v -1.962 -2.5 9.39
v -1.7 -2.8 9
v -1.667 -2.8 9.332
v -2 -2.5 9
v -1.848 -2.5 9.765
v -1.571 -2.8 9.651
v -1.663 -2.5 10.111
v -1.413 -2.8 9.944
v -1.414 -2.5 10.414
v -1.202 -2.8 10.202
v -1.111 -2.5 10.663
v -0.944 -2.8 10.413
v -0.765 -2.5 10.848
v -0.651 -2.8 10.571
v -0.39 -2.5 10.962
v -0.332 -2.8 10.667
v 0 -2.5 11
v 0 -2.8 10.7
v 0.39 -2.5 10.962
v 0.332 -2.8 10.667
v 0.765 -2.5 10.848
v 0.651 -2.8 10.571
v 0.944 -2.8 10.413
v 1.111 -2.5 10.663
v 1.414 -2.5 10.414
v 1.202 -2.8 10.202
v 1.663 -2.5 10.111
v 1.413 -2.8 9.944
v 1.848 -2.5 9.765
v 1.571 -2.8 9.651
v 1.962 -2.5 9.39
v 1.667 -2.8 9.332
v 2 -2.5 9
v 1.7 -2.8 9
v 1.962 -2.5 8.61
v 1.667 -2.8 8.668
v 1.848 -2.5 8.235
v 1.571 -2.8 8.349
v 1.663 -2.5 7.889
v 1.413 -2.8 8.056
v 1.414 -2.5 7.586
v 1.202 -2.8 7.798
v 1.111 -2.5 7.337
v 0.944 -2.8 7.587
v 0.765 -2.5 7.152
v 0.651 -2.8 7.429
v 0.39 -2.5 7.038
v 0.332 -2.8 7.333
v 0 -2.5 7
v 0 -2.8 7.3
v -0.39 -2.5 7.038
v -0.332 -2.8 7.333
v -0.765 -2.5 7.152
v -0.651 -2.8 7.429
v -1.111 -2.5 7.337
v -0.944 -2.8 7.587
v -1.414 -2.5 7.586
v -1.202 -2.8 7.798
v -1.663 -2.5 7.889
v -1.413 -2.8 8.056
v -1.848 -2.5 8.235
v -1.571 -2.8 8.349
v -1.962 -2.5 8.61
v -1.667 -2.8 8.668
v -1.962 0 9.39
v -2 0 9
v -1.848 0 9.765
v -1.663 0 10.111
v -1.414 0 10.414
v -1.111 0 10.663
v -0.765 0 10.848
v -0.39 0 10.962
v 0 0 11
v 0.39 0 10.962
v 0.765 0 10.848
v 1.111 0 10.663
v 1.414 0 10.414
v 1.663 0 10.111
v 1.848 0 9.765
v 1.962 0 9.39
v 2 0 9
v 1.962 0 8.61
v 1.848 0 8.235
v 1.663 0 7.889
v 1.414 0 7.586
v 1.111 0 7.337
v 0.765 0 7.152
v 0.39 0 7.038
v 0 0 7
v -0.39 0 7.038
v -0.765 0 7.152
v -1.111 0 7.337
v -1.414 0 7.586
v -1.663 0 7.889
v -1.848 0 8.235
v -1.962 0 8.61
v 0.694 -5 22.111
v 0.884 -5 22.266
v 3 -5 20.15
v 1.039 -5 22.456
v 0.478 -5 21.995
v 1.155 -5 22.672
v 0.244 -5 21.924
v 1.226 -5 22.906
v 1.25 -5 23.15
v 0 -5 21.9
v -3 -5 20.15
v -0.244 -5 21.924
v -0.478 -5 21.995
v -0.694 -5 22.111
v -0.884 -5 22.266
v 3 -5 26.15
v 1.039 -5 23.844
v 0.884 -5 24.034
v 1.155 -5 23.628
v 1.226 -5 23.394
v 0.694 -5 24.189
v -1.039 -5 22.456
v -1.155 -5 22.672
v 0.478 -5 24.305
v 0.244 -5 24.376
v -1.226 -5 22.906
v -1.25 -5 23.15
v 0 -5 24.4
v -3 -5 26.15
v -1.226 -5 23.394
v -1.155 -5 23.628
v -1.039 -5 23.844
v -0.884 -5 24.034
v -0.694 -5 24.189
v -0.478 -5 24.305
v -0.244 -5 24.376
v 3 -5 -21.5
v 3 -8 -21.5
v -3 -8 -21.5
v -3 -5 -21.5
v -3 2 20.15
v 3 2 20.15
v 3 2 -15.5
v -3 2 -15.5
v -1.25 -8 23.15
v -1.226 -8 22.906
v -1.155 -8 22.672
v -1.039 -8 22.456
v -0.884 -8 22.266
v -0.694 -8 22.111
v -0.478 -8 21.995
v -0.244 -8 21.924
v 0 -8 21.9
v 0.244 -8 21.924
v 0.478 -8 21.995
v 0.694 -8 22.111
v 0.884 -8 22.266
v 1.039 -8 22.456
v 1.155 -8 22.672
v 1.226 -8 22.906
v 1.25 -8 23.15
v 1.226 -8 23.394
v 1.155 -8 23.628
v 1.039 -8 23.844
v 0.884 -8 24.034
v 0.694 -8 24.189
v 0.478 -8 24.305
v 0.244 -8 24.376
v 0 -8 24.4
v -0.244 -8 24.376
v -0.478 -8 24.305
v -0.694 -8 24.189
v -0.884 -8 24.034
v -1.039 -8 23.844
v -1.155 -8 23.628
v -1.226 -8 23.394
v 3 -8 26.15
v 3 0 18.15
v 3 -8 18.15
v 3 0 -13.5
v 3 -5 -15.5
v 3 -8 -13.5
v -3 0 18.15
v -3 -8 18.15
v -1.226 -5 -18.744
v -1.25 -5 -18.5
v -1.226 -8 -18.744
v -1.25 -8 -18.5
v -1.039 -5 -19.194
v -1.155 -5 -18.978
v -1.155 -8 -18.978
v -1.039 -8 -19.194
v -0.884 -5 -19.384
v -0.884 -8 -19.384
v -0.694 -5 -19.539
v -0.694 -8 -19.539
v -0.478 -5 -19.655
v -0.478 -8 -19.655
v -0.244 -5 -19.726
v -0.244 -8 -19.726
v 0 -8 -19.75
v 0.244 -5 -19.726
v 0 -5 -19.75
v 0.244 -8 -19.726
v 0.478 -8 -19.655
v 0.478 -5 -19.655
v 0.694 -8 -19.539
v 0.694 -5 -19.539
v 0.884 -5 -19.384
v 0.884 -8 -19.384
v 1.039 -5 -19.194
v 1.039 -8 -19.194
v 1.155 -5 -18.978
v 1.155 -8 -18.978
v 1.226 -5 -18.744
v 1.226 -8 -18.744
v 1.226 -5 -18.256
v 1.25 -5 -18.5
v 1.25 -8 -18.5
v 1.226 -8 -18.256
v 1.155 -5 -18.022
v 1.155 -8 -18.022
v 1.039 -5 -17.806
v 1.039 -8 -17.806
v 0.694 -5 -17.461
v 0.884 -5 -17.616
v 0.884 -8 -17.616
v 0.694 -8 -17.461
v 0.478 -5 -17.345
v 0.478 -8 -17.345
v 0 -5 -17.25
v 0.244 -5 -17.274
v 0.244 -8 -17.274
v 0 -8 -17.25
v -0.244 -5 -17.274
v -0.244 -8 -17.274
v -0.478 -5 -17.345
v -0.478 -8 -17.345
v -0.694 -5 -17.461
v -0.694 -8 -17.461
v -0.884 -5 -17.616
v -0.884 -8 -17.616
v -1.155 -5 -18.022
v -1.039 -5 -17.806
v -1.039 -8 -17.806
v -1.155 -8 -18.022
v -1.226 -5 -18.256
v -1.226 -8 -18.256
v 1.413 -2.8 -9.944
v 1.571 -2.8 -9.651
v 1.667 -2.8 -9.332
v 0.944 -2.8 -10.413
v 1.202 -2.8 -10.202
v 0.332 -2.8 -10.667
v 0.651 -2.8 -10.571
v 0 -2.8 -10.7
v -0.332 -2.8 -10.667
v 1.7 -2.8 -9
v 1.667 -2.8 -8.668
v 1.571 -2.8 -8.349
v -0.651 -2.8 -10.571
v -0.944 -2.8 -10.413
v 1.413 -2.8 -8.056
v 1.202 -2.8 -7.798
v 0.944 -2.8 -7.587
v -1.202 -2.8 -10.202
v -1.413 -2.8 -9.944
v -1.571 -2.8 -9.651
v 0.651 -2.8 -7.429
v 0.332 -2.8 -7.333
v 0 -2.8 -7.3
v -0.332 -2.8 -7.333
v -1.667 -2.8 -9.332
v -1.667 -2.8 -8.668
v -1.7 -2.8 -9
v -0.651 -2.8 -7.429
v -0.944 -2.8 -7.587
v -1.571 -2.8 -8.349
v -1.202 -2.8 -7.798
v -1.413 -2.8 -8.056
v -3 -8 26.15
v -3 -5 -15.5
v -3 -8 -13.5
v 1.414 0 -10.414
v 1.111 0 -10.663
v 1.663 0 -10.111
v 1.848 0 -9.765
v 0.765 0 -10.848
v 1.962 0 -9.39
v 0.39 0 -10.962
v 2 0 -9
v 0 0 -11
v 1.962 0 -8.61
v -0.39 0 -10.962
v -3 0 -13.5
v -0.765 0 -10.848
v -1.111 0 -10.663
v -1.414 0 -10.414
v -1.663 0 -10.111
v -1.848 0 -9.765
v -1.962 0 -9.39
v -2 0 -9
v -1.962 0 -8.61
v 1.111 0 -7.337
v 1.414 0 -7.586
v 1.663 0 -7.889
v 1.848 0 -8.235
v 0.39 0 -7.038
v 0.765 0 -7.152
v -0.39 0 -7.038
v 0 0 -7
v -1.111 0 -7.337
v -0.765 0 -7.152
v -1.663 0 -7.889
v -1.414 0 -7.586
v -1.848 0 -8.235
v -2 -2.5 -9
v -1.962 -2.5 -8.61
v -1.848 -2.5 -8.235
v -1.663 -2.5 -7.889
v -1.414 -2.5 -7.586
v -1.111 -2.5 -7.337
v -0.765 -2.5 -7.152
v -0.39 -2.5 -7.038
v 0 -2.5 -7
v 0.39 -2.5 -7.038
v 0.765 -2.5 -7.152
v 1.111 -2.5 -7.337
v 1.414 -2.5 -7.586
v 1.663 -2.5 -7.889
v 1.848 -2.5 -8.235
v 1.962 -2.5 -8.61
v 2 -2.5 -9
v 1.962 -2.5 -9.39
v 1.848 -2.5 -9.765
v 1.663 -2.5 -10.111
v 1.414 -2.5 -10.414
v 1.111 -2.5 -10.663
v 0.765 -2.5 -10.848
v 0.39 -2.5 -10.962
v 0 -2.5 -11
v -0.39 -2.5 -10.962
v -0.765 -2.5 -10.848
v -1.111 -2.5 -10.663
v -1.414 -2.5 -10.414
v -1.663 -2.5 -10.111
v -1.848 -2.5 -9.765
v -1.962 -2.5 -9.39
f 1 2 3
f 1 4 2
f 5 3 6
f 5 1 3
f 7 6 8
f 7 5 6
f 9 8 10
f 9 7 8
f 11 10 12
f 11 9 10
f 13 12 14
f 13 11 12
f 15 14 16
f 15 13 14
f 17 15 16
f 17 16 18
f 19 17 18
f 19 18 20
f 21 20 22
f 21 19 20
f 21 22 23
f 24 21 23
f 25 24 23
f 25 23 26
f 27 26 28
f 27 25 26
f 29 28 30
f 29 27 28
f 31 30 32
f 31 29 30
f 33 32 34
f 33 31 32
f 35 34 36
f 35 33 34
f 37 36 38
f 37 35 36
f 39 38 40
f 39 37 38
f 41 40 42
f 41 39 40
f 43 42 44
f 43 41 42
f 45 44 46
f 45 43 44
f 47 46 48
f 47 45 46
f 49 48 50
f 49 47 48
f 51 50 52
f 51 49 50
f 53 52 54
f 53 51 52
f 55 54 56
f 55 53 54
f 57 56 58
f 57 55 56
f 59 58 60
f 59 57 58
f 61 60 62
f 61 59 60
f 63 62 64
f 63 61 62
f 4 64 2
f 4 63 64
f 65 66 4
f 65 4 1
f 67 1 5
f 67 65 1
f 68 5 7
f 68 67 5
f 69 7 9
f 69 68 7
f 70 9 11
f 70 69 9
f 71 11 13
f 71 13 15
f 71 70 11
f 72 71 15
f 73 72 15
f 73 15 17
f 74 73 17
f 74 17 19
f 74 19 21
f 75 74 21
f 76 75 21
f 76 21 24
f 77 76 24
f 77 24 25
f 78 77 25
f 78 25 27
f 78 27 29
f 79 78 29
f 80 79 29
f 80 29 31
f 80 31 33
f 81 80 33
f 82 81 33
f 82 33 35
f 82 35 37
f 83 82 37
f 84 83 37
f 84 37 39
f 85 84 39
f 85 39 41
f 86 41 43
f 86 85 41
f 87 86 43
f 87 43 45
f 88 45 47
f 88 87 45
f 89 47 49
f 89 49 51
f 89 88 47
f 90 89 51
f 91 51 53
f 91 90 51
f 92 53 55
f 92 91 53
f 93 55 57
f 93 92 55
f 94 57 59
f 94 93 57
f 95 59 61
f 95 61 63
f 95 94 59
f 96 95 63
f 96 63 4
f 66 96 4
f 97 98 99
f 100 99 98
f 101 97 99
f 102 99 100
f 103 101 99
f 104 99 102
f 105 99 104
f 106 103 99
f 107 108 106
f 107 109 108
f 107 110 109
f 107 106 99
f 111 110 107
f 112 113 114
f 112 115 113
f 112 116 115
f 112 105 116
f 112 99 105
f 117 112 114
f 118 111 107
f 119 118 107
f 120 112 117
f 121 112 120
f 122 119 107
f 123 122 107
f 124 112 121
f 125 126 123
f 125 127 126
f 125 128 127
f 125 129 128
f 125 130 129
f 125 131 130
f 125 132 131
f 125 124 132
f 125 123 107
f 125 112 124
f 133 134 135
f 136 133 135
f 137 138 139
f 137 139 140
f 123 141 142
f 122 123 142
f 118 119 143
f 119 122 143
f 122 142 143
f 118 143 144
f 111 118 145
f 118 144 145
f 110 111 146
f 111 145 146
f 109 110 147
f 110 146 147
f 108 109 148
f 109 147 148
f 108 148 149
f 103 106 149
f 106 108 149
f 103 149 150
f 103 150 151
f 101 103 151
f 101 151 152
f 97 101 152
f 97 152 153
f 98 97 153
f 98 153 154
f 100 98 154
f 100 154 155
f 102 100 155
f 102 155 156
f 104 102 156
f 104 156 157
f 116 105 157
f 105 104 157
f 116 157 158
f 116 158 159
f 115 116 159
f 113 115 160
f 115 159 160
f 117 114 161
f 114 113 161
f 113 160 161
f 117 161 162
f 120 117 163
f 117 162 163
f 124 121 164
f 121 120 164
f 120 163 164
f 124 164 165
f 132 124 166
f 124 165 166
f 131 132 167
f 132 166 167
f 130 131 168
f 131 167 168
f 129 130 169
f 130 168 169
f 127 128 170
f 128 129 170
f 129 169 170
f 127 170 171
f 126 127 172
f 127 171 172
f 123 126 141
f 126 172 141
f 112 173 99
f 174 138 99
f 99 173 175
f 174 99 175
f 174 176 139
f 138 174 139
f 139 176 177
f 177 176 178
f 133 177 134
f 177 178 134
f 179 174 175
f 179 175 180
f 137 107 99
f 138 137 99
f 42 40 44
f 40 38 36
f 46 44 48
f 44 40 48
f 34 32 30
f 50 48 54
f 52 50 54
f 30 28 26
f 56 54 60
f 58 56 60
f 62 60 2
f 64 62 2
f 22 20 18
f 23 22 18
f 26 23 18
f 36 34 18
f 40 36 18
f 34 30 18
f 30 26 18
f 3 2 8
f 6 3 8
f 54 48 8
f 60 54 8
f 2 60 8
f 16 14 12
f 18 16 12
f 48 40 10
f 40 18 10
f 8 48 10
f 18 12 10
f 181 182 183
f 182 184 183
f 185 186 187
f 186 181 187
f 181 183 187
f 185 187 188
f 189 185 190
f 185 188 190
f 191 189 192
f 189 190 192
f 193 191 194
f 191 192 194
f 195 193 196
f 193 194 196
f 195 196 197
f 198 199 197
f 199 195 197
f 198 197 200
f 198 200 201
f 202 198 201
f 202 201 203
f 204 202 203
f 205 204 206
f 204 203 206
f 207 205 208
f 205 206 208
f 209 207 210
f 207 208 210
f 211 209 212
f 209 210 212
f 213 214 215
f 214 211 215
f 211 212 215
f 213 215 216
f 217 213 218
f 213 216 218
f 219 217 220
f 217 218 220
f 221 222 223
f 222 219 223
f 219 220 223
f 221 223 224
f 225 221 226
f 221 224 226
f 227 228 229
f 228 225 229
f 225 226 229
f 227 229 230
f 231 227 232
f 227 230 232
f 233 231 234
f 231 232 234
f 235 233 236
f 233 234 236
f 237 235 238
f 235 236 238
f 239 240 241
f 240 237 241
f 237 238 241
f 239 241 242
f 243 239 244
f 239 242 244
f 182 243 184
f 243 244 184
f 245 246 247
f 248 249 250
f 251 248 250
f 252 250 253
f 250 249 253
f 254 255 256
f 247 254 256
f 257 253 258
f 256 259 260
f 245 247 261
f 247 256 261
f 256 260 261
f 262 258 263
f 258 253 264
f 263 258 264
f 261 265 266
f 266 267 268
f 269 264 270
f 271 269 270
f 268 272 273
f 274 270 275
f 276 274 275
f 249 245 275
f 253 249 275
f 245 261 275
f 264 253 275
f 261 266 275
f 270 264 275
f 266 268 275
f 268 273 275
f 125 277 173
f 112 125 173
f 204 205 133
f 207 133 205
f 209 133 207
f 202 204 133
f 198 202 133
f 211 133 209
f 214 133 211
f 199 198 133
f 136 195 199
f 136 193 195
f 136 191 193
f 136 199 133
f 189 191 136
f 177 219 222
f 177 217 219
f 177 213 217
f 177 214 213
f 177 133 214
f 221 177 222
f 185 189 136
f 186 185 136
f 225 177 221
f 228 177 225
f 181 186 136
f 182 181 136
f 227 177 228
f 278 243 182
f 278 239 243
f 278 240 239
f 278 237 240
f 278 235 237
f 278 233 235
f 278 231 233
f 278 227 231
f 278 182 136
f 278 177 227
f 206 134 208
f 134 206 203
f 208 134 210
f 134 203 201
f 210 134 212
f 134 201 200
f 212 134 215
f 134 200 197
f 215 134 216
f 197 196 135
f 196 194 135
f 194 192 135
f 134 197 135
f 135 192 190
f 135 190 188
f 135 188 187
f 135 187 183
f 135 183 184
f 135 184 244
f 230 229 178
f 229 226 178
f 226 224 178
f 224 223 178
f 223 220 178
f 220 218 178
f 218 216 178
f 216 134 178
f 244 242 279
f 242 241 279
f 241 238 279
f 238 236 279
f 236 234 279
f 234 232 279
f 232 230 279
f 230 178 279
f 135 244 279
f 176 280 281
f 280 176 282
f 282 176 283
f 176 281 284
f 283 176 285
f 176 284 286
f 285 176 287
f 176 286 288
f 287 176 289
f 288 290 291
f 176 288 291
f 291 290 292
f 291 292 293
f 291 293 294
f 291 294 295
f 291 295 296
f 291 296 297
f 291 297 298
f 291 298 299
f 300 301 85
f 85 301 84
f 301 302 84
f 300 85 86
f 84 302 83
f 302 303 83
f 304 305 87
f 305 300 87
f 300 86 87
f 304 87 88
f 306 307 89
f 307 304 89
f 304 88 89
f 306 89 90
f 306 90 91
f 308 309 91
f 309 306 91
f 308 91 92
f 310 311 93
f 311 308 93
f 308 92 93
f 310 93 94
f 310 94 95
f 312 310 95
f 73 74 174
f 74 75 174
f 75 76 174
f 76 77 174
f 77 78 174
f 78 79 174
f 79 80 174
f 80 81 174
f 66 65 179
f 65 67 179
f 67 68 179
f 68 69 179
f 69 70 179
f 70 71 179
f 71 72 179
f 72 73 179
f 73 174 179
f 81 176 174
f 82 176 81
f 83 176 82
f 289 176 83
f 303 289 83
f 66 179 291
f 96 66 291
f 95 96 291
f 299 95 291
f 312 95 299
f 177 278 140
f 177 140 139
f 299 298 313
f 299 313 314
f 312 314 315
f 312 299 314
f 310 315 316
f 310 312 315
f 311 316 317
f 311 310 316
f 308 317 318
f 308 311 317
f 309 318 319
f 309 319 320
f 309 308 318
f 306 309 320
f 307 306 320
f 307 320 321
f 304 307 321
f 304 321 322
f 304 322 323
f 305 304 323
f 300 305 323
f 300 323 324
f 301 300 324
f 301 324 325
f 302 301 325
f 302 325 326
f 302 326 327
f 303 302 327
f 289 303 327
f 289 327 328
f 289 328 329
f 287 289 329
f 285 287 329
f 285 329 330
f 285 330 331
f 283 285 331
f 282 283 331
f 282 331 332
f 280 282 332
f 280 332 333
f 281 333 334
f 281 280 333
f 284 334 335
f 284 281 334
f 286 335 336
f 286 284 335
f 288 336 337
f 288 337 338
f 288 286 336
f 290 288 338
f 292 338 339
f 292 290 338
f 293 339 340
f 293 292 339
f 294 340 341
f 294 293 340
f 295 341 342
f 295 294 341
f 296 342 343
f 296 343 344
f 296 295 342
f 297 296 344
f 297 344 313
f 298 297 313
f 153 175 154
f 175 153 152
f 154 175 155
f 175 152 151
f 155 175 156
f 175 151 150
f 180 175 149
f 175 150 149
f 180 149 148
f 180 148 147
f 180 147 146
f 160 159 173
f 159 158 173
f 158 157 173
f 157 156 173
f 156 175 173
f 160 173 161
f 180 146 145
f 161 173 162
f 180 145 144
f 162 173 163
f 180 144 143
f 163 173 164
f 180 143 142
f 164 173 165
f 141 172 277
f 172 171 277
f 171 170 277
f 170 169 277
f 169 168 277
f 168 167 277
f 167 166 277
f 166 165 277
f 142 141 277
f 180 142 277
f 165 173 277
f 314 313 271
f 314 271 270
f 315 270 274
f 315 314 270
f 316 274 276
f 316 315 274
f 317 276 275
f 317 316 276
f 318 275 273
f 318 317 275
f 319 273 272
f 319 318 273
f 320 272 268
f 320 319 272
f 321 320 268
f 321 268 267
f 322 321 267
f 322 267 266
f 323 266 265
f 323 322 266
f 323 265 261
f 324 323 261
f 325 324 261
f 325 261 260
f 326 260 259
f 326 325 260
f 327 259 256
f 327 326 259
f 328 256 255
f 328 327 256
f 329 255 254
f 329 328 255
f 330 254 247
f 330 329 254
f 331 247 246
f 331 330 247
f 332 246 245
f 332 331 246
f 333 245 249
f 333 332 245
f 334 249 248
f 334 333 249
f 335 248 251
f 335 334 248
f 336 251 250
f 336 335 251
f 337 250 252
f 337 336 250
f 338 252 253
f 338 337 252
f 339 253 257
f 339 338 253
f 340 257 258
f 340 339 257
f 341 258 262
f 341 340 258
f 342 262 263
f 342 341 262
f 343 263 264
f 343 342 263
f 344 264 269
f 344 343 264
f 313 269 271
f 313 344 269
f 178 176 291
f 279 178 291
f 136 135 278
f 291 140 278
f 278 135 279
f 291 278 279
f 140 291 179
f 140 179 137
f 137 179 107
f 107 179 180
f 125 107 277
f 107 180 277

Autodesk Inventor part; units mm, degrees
ref_plane "YZ Plane" through (0, 0, 0) normal (1, 0, 0) x (0, 1, 0)
ref_plane "XZ Plane" through (0, 0, 0) normal (0, 1, 0) x (-1, 0, 0)
ref_plane "XY Plane" through (0, 0, 0) normal (0, 0, 1) x (1, 0, 0)
sketch "スケッチ1" plane through (0, 0, 0) normal (0, 1, 0) x (-1, 0, 0)
  line L0 (3, 26.15) -> (-3, 26.15)
  line L1 (-3, 26.15) -> (-3, -21.5)
  line L2 (-3, -21.5) -> (3, -21.5)
  line L3 (3, -21.5) -> (3, 26.15)
  line L4 (4.2, 0) -> (-4.2, 0) construction
  line L5 (4.2, 9) -> (-4.2, 9) construction
  line L6 (4.2, -9) -> (-4.2, -9) construction
  line L7 (0, -31.03) -> (0, 35.68) construction
  circle A0 centre (0, 9) radius 2
  circle A1 centre (0, -9) radius 2
  line L8 (0, 26.15) -> (0, -21.5) construction
  line L9 (3, 20.15) -> (-3, 20.15)
  line L10 (3, -15.5) -> (-3, -15.5)
  line L11 (3, 26.15) -> (-3, 20.15) construction
  line L12 (3, -15.5) -> (-3, -21.5) construction
  circle A2 centre (0, 23.15) radius 1.25
  circle A3 centre (0, -18.5) radius 1.25
  line L13 (-3, 18.15) -> (3, 18.15)
  line L14 (-3, -13.5) -> (3, -13.5)
  point P0 (0, 0)
  dimension "d0" = 6
  dimension "d1" = 9
  dimension "d2" = 9
  dimension "d3" = 4
  dimension "d4" = 12.5
  dimension "d5" = 17.15
  dimension "d6" = 6
  dimension "d7" = 6
  dimension "d8" = 2.5
  dimension "d11" = 4.5
  dimension "d12" = 9.15
extrude "押し出し1" add sketch "スケッチ1" along normal blind 2 contours L3 L13 L1 L9 | L3 L14 L1 L13 | L3 L10 L1 L14 | A0 | A1
extrude "押し出し2" add sketch "スケッチ1" against normal blind 8 contours L3 L13 L1 L9 | L3 L10 L1 L14
extrude "押し出し3" add sketch "スケッチ1" along normal blind 3 from surface at -8 contours L3 L9 L1 L0 | L3 L2 L1 L10
extrude "押し出し4" add sketch "スケッチ1" against normal blind 2.8 contours A0 | A1
chamfer "面取り1" distance 0.3 angle 45 2 edges at (2, -2.8, 9) (2, -2.8, -9)
properties part number "housing_xl320"
